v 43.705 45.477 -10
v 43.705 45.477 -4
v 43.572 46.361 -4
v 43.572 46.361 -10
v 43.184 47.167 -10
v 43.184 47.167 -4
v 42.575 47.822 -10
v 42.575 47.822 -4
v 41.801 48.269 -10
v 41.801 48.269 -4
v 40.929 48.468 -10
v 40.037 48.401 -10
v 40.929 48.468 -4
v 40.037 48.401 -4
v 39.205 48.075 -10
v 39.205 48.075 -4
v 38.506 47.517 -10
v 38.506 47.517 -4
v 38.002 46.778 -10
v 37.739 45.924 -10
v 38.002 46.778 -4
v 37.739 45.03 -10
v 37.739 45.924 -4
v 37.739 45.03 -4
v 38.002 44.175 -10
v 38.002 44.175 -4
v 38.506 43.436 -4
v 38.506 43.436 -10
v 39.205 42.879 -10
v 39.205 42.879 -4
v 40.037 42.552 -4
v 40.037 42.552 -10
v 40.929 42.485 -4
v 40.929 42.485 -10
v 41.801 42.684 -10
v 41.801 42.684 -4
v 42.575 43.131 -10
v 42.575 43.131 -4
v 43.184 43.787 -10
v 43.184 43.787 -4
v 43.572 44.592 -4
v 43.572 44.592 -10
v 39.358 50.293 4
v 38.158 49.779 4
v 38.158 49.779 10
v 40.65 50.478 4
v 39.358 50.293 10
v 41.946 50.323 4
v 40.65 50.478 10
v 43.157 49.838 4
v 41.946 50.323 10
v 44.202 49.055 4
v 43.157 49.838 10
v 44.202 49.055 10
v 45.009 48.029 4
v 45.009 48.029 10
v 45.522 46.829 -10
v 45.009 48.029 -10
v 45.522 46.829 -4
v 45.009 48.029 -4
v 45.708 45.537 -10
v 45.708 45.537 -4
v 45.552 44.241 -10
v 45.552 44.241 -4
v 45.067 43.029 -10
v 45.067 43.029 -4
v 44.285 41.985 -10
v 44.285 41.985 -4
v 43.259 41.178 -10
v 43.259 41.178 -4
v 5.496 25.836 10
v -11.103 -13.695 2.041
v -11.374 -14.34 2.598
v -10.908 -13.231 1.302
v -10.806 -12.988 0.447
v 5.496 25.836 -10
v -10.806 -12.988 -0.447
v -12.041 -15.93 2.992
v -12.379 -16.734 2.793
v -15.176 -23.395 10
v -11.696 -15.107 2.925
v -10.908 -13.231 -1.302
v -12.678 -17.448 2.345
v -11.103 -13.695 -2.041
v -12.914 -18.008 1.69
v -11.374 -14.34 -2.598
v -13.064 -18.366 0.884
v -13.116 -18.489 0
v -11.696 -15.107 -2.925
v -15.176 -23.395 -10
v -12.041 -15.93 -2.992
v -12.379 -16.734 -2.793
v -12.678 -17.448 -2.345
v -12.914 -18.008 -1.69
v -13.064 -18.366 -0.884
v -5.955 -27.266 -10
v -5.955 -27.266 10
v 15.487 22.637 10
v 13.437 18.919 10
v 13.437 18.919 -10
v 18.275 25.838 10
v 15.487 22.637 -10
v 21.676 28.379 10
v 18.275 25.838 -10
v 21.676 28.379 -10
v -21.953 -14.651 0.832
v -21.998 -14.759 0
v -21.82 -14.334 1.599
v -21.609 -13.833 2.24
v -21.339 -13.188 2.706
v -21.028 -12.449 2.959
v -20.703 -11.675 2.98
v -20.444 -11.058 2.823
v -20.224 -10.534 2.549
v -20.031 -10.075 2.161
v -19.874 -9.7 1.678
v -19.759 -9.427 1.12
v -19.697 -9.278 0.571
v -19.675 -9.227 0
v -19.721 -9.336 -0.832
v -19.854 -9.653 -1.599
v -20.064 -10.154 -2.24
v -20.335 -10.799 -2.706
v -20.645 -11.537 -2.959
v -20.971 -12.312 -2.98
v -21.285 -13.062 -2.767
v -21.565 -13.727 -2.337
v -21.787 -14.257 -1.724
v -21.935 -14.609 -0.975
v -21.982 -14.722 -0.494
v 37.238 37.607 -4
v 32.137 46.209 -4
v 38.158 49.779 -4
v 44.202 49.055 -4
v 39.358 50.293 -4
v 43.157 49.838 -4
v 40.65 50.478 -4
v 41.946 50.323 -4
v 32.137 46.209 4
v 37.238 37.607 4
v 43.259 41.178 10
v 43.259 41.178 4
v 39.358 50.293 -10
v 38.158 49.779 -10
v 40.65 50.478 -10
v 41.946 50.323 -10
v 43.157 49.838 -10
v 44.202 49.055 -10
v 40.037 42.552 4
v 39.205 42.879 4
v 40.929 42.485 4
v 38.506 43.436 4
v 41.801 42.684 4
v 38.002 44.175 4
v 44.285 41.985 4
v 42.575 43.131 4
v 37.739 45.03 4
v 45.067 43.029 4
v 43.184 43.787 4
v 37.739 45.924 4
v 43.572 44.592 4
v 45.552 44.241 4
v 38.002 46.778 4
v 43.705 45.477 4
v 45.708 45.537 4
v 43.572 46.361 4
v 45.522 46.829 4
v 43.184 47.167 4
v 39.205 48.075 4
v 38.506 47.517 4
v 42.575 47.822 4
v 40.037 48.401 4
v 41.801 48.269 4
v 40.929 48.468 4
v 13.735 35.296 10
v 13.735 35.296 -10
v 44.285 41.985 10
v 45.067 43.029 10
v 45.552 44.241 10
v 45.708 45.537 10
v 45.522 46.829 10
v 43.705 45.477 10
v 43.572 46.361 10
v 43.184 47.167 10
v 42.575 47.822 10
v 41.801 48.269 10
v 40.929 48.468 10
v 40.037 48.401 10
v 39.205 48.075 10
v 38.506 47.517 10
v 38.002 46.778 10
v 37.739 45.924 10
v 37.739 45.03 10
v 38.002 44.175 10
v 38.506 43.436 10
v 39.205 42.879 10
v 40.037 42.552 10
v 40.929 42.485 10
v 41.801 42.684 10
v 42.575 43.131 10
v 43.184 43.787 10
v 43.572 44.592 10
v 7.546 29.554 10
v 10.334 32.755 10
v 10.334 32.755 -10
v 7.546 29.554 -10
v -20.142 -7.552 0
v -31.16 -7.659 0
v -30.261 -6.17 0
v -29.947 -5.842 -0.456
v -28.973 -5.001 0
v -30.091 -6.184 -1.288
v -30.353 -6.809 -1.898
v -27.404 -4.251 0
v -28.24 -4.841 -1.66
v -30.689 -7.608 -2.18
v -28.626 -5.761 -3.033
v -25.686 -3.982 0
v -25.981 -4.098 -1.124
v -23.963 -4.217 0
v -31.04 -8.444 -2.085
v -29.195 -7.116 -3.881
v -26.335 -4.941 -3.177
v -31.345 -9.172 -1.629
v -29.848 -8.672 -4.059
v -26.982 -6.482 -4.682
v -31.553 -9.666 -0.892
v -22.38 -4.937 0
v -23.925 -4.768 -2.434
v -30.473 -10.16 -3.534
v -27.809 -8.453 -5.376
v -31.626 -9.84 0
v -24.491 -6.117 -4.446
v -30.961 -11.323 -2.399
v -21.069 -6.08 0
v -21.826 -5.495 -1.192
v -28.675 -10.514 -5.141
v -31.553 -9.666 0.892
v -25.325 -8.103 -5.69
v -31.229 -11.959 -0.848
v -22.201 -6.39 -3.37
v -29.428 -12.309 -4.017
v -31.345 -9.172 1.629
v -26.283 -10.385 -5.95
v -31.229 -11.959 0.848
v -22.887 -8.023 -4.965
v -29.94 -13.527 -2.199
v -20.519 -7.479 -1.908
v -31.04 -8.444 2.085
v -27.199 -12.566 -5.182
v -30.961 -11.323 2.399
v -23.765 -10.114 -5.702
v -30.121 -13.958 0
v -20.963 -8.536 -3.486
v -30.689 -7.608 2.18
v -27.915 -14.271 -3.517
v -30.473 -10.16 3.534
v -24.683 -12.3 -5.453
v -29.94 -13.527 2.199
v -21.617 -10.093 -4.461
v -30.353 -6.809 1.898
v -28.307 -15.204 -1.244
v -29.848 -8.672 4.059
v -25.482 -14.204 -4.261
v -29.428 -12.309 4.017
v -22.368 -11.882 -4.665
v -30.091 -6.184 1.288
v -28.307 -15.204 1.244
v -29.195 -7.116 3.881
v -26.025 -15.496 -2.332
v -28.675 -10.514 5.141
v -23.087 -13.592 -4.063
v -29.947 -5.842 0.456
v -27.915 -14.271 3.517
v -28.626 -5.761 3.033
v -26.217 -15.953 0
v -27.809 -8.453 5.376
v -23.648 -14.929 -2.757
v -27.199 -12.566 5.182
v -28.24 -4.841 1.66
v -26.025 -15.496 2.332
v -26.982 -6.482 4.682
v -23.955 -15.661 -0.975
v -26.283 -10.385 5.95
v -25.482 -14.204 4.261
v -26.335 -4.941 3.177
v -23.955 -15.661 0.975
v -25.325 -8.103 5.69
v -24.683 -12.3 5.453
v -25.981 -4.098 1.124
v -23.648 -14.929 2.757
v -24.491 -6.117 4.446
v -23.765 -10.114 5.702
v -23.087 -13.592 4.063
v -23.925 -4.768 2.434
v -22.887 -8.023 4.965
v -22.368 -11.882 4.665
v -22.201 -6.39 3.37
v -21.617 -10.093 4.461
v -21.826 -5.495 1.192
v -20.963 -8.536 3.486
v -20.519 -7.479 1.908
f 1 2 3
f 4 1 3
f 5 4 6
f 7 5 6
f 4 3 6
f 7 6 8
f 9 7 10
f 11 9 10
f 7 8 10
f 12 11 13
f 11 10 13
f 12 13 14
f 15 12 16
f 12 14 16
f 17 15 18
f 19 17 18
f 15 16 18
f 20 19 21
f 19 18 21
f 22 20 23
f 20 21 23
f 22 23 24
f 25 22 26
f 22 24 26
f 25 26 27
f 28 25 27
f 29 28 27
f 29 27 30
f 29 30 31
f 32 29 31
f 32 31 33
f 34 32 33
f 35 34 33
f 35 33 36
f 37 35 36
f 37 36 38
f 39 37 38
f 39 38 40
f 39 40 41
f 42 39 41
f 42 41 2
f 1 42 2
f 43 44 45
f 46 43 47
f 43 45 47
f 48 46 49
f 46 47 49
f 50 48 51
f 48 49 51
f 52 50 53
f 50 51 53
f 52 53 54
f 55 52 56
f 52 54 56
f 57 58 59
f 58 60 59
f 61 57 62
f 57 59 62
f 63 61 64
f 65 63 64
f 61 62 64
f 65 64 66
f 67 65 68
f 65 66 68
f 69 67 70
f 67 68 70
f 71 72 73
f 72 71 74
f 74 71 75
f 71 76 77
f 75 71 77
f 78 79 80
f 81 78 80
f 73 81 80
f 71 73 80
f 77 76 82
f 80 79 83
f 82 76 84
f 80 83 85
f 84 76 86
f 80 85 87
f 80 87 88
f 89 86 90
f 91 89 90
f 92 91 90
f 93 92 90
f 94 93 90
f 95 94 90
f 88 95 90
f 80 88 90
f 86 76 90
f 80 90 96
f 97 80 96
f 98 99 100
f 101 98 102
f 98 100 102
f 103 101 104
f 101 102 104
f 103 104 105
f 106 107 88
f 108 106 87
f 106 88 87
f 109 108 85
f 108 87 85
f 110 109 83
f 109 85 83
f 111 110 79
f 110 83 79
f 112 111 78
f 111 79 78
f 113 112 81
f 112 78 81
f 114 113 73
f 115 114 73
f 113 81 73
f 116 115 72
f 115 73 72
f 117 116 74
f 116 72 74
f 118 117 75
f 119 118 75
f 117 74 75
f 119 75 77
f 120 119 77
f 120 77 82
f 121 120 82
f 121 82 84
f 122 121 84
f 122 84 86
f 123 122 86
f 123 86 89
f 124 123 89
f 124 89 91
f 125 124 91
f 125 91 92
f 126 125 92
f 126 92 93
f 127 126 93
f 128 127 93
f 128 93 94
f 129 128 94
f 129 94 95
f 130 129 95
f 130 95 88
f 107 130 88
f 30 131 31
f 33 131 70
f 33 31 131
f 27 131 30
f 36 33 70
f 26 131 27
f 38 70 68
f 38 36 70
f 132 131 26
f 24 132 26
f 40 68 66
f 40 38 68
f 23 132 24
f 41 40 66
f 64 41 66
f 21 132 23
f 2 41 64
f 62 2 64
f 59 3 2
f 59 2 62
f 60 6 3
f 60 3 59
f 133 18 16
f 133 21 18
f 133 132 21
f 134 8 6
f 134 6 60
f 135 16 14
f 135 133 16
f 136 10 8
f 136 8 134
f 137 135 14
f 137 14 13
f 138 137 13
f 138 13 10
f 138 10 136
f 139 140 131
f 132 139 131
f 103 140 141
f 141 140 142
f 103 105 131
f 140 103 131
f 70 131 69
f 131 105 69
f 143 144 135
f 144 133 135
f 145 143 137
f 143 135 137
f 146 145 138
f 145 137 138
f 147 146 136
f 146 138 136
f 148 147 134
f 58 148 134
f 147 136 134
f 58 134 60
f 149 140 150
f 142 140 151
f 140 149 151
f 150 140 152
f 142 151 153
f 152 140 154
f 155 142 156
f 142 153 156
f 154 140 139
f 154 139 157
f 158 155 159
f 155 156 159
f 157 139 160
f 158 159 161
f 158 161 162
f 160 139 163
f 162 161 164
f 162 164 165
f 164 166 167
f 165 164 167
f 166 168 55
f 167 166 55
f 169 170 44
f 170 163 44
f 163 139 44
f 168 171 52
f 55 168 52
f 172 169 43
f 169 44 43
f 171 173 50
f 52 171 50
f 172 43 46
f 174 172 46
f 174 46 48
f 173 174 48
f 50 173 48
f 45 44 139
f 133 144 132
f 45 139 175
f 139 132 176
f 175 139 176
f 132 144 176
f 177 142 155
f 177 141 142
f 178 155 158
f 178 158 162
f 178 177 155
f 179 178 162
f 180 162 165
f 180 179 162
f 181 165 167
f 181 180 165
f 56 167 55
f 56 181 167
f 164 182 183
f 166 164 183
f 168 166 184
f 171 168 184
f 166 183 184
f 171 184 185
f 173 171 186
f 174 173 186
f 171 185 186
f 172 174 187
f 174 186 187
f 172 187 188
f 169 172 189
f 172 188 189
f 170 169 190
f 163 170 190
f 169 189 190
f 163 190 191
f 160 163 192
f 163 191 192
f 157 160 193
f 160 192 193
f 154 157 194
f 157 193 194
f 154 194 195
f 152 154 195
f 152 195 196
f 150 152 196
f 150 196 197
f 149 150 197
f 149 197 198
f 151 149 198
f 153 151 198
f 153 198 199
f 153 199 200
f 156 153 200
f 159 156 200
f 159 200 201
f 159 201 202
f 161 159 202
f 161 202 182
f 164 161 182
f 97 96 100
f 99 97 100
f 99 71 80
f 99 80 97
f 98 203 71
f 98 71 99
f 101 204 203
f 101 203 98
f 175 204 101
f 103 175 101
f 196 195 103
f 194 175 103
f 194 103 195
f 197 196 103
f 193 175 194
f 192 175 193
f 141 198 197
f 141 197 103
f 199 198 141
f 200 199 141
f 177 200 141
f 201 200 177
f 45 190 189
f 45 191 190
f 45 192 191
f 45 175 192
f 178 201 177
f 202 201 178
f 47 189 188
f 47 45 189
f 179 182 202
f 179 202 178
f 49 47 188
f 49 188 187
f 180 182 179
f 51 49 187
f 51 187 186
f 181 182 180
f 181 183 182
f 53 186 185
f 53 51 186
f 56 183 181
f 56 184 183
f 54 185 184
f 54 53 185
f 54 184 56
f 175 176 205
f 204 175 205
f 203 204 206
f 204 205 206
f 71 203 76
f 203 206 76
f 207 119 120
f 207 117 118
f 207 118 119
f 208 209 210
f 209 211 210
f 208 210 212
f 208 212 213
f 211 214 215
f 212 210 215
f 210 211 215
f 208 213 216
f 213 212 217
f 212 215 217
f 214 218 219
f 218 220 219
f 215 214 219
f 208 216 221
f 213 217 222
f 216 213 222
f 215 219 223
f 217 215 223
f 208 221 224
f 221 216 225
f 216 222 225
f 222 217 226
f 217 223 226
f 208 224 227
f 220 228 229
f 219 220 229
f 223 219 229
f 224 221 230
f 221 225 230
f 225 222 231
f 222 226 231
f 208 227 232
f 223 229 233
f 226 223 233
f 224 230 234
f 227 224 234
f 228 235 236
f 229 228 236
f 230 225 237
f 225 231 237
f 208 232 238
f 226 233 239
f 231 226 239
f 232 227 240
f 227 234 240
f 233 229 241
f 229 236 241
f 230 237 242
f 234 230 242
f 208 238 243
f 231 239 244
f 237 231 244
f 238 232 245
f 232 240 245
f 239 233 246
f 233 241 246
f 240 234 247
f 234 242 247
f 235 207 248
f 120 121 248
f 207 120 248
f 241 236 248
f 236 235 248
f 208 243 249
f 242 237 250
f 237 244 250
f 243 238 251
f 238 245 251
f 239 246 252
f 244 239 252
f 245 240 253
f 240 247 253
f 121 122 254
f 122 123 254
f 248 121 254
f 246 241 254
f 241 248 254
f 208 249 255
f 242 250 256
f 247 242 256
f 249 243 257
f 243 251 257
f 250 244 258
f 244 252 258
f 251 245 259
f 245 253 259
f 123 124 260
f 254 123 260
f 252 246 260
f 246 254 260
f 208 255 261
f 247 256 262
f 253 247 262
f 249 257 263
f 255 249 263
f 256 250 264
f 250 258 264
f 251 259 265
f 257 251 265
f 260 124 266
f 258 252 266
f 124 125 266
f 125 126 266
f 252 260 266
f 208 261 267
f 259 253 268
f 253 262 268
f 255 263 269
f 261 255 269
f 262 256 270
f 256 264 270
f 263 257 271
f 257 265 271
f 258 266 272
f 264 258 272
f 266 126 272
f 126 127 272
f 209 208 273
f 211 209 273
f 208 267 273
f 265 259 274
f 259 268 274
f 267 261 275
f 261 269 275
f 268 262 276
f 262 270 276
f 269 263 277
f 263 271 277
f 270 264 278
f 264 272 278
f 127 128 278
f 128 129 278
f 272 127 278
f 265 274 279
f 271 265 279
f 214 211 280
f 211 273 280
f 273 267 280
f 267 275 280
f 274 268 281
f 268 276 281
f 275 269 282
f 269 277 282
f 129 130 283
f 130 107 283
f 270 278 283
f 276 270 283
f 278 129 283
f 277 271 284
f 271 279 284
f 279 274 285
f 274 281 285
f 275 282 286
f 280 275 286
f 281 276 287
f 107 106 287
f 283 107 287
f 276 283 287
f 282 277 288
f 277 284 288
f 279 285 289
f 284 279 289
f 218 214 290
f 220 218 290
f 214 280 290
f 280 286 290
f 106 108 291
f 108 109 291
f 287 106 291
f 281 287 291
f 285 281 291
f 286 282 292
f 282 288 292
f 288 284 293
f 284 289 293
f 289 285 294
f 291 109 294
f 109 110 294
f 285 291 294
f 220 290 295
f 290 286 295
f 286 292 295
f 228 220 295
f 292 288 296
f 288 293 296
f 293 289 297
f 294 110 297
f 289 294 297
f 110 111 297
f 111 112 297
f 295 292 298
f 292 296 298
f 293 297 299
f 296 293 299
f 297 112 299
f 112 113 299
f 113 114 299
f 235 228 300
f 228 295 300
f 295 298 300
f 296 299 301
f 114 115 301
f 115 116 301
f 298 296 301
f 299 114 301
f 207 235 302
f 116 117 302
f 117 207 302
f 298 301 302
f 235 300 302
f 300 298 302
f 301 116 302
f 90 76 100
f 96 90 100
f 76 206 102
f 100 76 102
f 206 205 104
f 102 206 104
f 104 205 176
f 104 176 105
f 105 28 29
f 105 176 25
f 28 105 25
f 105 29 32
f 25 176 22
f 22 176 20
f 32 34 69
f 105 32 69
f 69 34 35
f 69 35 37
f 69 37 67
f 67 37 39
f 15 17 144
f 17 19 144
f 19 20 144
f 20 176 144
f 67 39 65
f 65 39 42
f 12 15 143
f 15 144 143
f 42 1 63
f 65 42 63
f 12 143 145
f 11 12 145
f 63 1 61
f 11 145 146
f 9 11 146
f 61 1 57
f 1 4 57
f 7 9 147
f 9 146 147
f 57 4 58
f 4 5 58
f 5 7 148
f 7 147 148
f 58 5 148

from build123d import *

# Parameters (mm, degrees)
BOSS_EXTRU_1_DEPTH      = 10
BOSS_EXTRU_1_DEPTH_BACK = 10
ESQUISSE2_W             = 16.778324123
ESQUISSE2_H             = 8
ENL_V_MAT_EXTRU_2_DEPTH = 77.675205123
ESQUISSE3_R             = 3
ENL_V_MAT_EXTRU_3_DEPTH = 74.486360502
ESQUISSE4_R             = 3
BOSS_EXTRU_2_DEPTH      = 10
CONG_2_R                = 5


with BuildPart() as part:
    # Esquisse1 → Boss.-Extru.1 (new, two sides: drawn at the far end of the back side and taken through both)
    with BuildSketch(Plane.XY.offset(-BOSS_EXTRU_1_DEPTH_BACK)):
        with BuildLine():
            Line((42.458304448, 52.329533504), (13.73470128, 35.295768835))
            ThreePointArc((13.73470128, 35.295768835), (8.854424282, 31.228601734), (5.495862123, 25.836105835))
            Line((5.495862123, 25.836105835), (-15.175609455, -23.394635688))
            Line((-15.175609455, -23.394635688), (-5.955424705, -27.266094479))
            Line((-5.955424705, -27.266094479), (13.437406292, 18.919463554))
            ThreePointArc((13.437406292, 18.919463554), (16.795968451, 24.311959453), (21.676245449, 28.379126554))
            Line((21.676245449, 28.379126554), (47.55906962, 43.728243213))
            Line((47.55906962, 43.728243213), (42.458304448, 52.329533504))
        make_face()
    extrude(amount=BOSS_EXTRU_1_DEPTH + BOSS_EXTRU_1_DEPTH_BACK)

    # Esquisse2 → Enlèv. mat.-Extru.2 (cut, through all)
    with BuildSketch(Plane(origin=(-11.911901978, 20.08673667, 0), x_dir=(0.8601290290322577, 0.5100765172168049, 0), z_dir=(-0.5100765172168049, 0.8601290290322577, 0))):
        with Locations((59.600848438, 0)):
            Rectangle(ESQUISSE2_W, ESQUISSE2_H)
    extrude(amount=-ENL_V_MAT_EXTRU_2_DEPTH, mode=Mode.SUBTRACT)

    # Esquisse3 → Enlèv. mat.-Extru.3 (cut, through all)
    with BuildSketch(Plane.XY.offset(10)):
        with Locations((40.705018812, 45.476713018)):
            Circle(ESQUISSE3_R)
    extrude(amount=-ENL_V_MAT_EXTRU_3_DEPTH, mode=Mode.SUBTRACT)

    # Esquisse4 → Boss.-Extru.2 (add)
    with BuildSketch(Plane(origin=(-4.550212337, 1.910586396, 0), x_dir=(0, 0, 1), z_dir=(-0.9220184750588774, 0.38714587903024655, 0))):
        with Locations(Location((0, -19.124935546, 0), (0, 0, 270))):
            Circle(ESQUISSE4_R)
    extrude(amount=BOSS_EXTRU_2_DEPTH)

    # Esquisse5 → Révolution1 (revolve)
    with BuildSketch(Plane.XY):
        with BuildLine():
            Line((-20.095687486, -12.304496338), (-31.159909187, -7.658745789))
            ThreePointArc((-31.159909187, -7.658745789), (-23.304923062, -4.449510213), (-20.095687486, -12.304496338))
        make_face()
    revolve(axis=Axis((-21.174537071, -11.851498722, 0), (-0.9220184750588776, 0.3871458790302464, 0)))

    # Congé2
    cong_2_edges = [part.edges().sort_by_distance(p)[0] for p in [
        (47.55906962, 43.728243213, 7),
        (42.458304448, 52.329533504, 7),
        (42.458304448, 52.329533504, -7),
        (47.55906962, 43.728243213, -7),
    ]]
    fillet(cong_2_edges, radius=CONG_2_R - 0.0001)  # a hair under: the kernel refuses the full size


solid = part.part
